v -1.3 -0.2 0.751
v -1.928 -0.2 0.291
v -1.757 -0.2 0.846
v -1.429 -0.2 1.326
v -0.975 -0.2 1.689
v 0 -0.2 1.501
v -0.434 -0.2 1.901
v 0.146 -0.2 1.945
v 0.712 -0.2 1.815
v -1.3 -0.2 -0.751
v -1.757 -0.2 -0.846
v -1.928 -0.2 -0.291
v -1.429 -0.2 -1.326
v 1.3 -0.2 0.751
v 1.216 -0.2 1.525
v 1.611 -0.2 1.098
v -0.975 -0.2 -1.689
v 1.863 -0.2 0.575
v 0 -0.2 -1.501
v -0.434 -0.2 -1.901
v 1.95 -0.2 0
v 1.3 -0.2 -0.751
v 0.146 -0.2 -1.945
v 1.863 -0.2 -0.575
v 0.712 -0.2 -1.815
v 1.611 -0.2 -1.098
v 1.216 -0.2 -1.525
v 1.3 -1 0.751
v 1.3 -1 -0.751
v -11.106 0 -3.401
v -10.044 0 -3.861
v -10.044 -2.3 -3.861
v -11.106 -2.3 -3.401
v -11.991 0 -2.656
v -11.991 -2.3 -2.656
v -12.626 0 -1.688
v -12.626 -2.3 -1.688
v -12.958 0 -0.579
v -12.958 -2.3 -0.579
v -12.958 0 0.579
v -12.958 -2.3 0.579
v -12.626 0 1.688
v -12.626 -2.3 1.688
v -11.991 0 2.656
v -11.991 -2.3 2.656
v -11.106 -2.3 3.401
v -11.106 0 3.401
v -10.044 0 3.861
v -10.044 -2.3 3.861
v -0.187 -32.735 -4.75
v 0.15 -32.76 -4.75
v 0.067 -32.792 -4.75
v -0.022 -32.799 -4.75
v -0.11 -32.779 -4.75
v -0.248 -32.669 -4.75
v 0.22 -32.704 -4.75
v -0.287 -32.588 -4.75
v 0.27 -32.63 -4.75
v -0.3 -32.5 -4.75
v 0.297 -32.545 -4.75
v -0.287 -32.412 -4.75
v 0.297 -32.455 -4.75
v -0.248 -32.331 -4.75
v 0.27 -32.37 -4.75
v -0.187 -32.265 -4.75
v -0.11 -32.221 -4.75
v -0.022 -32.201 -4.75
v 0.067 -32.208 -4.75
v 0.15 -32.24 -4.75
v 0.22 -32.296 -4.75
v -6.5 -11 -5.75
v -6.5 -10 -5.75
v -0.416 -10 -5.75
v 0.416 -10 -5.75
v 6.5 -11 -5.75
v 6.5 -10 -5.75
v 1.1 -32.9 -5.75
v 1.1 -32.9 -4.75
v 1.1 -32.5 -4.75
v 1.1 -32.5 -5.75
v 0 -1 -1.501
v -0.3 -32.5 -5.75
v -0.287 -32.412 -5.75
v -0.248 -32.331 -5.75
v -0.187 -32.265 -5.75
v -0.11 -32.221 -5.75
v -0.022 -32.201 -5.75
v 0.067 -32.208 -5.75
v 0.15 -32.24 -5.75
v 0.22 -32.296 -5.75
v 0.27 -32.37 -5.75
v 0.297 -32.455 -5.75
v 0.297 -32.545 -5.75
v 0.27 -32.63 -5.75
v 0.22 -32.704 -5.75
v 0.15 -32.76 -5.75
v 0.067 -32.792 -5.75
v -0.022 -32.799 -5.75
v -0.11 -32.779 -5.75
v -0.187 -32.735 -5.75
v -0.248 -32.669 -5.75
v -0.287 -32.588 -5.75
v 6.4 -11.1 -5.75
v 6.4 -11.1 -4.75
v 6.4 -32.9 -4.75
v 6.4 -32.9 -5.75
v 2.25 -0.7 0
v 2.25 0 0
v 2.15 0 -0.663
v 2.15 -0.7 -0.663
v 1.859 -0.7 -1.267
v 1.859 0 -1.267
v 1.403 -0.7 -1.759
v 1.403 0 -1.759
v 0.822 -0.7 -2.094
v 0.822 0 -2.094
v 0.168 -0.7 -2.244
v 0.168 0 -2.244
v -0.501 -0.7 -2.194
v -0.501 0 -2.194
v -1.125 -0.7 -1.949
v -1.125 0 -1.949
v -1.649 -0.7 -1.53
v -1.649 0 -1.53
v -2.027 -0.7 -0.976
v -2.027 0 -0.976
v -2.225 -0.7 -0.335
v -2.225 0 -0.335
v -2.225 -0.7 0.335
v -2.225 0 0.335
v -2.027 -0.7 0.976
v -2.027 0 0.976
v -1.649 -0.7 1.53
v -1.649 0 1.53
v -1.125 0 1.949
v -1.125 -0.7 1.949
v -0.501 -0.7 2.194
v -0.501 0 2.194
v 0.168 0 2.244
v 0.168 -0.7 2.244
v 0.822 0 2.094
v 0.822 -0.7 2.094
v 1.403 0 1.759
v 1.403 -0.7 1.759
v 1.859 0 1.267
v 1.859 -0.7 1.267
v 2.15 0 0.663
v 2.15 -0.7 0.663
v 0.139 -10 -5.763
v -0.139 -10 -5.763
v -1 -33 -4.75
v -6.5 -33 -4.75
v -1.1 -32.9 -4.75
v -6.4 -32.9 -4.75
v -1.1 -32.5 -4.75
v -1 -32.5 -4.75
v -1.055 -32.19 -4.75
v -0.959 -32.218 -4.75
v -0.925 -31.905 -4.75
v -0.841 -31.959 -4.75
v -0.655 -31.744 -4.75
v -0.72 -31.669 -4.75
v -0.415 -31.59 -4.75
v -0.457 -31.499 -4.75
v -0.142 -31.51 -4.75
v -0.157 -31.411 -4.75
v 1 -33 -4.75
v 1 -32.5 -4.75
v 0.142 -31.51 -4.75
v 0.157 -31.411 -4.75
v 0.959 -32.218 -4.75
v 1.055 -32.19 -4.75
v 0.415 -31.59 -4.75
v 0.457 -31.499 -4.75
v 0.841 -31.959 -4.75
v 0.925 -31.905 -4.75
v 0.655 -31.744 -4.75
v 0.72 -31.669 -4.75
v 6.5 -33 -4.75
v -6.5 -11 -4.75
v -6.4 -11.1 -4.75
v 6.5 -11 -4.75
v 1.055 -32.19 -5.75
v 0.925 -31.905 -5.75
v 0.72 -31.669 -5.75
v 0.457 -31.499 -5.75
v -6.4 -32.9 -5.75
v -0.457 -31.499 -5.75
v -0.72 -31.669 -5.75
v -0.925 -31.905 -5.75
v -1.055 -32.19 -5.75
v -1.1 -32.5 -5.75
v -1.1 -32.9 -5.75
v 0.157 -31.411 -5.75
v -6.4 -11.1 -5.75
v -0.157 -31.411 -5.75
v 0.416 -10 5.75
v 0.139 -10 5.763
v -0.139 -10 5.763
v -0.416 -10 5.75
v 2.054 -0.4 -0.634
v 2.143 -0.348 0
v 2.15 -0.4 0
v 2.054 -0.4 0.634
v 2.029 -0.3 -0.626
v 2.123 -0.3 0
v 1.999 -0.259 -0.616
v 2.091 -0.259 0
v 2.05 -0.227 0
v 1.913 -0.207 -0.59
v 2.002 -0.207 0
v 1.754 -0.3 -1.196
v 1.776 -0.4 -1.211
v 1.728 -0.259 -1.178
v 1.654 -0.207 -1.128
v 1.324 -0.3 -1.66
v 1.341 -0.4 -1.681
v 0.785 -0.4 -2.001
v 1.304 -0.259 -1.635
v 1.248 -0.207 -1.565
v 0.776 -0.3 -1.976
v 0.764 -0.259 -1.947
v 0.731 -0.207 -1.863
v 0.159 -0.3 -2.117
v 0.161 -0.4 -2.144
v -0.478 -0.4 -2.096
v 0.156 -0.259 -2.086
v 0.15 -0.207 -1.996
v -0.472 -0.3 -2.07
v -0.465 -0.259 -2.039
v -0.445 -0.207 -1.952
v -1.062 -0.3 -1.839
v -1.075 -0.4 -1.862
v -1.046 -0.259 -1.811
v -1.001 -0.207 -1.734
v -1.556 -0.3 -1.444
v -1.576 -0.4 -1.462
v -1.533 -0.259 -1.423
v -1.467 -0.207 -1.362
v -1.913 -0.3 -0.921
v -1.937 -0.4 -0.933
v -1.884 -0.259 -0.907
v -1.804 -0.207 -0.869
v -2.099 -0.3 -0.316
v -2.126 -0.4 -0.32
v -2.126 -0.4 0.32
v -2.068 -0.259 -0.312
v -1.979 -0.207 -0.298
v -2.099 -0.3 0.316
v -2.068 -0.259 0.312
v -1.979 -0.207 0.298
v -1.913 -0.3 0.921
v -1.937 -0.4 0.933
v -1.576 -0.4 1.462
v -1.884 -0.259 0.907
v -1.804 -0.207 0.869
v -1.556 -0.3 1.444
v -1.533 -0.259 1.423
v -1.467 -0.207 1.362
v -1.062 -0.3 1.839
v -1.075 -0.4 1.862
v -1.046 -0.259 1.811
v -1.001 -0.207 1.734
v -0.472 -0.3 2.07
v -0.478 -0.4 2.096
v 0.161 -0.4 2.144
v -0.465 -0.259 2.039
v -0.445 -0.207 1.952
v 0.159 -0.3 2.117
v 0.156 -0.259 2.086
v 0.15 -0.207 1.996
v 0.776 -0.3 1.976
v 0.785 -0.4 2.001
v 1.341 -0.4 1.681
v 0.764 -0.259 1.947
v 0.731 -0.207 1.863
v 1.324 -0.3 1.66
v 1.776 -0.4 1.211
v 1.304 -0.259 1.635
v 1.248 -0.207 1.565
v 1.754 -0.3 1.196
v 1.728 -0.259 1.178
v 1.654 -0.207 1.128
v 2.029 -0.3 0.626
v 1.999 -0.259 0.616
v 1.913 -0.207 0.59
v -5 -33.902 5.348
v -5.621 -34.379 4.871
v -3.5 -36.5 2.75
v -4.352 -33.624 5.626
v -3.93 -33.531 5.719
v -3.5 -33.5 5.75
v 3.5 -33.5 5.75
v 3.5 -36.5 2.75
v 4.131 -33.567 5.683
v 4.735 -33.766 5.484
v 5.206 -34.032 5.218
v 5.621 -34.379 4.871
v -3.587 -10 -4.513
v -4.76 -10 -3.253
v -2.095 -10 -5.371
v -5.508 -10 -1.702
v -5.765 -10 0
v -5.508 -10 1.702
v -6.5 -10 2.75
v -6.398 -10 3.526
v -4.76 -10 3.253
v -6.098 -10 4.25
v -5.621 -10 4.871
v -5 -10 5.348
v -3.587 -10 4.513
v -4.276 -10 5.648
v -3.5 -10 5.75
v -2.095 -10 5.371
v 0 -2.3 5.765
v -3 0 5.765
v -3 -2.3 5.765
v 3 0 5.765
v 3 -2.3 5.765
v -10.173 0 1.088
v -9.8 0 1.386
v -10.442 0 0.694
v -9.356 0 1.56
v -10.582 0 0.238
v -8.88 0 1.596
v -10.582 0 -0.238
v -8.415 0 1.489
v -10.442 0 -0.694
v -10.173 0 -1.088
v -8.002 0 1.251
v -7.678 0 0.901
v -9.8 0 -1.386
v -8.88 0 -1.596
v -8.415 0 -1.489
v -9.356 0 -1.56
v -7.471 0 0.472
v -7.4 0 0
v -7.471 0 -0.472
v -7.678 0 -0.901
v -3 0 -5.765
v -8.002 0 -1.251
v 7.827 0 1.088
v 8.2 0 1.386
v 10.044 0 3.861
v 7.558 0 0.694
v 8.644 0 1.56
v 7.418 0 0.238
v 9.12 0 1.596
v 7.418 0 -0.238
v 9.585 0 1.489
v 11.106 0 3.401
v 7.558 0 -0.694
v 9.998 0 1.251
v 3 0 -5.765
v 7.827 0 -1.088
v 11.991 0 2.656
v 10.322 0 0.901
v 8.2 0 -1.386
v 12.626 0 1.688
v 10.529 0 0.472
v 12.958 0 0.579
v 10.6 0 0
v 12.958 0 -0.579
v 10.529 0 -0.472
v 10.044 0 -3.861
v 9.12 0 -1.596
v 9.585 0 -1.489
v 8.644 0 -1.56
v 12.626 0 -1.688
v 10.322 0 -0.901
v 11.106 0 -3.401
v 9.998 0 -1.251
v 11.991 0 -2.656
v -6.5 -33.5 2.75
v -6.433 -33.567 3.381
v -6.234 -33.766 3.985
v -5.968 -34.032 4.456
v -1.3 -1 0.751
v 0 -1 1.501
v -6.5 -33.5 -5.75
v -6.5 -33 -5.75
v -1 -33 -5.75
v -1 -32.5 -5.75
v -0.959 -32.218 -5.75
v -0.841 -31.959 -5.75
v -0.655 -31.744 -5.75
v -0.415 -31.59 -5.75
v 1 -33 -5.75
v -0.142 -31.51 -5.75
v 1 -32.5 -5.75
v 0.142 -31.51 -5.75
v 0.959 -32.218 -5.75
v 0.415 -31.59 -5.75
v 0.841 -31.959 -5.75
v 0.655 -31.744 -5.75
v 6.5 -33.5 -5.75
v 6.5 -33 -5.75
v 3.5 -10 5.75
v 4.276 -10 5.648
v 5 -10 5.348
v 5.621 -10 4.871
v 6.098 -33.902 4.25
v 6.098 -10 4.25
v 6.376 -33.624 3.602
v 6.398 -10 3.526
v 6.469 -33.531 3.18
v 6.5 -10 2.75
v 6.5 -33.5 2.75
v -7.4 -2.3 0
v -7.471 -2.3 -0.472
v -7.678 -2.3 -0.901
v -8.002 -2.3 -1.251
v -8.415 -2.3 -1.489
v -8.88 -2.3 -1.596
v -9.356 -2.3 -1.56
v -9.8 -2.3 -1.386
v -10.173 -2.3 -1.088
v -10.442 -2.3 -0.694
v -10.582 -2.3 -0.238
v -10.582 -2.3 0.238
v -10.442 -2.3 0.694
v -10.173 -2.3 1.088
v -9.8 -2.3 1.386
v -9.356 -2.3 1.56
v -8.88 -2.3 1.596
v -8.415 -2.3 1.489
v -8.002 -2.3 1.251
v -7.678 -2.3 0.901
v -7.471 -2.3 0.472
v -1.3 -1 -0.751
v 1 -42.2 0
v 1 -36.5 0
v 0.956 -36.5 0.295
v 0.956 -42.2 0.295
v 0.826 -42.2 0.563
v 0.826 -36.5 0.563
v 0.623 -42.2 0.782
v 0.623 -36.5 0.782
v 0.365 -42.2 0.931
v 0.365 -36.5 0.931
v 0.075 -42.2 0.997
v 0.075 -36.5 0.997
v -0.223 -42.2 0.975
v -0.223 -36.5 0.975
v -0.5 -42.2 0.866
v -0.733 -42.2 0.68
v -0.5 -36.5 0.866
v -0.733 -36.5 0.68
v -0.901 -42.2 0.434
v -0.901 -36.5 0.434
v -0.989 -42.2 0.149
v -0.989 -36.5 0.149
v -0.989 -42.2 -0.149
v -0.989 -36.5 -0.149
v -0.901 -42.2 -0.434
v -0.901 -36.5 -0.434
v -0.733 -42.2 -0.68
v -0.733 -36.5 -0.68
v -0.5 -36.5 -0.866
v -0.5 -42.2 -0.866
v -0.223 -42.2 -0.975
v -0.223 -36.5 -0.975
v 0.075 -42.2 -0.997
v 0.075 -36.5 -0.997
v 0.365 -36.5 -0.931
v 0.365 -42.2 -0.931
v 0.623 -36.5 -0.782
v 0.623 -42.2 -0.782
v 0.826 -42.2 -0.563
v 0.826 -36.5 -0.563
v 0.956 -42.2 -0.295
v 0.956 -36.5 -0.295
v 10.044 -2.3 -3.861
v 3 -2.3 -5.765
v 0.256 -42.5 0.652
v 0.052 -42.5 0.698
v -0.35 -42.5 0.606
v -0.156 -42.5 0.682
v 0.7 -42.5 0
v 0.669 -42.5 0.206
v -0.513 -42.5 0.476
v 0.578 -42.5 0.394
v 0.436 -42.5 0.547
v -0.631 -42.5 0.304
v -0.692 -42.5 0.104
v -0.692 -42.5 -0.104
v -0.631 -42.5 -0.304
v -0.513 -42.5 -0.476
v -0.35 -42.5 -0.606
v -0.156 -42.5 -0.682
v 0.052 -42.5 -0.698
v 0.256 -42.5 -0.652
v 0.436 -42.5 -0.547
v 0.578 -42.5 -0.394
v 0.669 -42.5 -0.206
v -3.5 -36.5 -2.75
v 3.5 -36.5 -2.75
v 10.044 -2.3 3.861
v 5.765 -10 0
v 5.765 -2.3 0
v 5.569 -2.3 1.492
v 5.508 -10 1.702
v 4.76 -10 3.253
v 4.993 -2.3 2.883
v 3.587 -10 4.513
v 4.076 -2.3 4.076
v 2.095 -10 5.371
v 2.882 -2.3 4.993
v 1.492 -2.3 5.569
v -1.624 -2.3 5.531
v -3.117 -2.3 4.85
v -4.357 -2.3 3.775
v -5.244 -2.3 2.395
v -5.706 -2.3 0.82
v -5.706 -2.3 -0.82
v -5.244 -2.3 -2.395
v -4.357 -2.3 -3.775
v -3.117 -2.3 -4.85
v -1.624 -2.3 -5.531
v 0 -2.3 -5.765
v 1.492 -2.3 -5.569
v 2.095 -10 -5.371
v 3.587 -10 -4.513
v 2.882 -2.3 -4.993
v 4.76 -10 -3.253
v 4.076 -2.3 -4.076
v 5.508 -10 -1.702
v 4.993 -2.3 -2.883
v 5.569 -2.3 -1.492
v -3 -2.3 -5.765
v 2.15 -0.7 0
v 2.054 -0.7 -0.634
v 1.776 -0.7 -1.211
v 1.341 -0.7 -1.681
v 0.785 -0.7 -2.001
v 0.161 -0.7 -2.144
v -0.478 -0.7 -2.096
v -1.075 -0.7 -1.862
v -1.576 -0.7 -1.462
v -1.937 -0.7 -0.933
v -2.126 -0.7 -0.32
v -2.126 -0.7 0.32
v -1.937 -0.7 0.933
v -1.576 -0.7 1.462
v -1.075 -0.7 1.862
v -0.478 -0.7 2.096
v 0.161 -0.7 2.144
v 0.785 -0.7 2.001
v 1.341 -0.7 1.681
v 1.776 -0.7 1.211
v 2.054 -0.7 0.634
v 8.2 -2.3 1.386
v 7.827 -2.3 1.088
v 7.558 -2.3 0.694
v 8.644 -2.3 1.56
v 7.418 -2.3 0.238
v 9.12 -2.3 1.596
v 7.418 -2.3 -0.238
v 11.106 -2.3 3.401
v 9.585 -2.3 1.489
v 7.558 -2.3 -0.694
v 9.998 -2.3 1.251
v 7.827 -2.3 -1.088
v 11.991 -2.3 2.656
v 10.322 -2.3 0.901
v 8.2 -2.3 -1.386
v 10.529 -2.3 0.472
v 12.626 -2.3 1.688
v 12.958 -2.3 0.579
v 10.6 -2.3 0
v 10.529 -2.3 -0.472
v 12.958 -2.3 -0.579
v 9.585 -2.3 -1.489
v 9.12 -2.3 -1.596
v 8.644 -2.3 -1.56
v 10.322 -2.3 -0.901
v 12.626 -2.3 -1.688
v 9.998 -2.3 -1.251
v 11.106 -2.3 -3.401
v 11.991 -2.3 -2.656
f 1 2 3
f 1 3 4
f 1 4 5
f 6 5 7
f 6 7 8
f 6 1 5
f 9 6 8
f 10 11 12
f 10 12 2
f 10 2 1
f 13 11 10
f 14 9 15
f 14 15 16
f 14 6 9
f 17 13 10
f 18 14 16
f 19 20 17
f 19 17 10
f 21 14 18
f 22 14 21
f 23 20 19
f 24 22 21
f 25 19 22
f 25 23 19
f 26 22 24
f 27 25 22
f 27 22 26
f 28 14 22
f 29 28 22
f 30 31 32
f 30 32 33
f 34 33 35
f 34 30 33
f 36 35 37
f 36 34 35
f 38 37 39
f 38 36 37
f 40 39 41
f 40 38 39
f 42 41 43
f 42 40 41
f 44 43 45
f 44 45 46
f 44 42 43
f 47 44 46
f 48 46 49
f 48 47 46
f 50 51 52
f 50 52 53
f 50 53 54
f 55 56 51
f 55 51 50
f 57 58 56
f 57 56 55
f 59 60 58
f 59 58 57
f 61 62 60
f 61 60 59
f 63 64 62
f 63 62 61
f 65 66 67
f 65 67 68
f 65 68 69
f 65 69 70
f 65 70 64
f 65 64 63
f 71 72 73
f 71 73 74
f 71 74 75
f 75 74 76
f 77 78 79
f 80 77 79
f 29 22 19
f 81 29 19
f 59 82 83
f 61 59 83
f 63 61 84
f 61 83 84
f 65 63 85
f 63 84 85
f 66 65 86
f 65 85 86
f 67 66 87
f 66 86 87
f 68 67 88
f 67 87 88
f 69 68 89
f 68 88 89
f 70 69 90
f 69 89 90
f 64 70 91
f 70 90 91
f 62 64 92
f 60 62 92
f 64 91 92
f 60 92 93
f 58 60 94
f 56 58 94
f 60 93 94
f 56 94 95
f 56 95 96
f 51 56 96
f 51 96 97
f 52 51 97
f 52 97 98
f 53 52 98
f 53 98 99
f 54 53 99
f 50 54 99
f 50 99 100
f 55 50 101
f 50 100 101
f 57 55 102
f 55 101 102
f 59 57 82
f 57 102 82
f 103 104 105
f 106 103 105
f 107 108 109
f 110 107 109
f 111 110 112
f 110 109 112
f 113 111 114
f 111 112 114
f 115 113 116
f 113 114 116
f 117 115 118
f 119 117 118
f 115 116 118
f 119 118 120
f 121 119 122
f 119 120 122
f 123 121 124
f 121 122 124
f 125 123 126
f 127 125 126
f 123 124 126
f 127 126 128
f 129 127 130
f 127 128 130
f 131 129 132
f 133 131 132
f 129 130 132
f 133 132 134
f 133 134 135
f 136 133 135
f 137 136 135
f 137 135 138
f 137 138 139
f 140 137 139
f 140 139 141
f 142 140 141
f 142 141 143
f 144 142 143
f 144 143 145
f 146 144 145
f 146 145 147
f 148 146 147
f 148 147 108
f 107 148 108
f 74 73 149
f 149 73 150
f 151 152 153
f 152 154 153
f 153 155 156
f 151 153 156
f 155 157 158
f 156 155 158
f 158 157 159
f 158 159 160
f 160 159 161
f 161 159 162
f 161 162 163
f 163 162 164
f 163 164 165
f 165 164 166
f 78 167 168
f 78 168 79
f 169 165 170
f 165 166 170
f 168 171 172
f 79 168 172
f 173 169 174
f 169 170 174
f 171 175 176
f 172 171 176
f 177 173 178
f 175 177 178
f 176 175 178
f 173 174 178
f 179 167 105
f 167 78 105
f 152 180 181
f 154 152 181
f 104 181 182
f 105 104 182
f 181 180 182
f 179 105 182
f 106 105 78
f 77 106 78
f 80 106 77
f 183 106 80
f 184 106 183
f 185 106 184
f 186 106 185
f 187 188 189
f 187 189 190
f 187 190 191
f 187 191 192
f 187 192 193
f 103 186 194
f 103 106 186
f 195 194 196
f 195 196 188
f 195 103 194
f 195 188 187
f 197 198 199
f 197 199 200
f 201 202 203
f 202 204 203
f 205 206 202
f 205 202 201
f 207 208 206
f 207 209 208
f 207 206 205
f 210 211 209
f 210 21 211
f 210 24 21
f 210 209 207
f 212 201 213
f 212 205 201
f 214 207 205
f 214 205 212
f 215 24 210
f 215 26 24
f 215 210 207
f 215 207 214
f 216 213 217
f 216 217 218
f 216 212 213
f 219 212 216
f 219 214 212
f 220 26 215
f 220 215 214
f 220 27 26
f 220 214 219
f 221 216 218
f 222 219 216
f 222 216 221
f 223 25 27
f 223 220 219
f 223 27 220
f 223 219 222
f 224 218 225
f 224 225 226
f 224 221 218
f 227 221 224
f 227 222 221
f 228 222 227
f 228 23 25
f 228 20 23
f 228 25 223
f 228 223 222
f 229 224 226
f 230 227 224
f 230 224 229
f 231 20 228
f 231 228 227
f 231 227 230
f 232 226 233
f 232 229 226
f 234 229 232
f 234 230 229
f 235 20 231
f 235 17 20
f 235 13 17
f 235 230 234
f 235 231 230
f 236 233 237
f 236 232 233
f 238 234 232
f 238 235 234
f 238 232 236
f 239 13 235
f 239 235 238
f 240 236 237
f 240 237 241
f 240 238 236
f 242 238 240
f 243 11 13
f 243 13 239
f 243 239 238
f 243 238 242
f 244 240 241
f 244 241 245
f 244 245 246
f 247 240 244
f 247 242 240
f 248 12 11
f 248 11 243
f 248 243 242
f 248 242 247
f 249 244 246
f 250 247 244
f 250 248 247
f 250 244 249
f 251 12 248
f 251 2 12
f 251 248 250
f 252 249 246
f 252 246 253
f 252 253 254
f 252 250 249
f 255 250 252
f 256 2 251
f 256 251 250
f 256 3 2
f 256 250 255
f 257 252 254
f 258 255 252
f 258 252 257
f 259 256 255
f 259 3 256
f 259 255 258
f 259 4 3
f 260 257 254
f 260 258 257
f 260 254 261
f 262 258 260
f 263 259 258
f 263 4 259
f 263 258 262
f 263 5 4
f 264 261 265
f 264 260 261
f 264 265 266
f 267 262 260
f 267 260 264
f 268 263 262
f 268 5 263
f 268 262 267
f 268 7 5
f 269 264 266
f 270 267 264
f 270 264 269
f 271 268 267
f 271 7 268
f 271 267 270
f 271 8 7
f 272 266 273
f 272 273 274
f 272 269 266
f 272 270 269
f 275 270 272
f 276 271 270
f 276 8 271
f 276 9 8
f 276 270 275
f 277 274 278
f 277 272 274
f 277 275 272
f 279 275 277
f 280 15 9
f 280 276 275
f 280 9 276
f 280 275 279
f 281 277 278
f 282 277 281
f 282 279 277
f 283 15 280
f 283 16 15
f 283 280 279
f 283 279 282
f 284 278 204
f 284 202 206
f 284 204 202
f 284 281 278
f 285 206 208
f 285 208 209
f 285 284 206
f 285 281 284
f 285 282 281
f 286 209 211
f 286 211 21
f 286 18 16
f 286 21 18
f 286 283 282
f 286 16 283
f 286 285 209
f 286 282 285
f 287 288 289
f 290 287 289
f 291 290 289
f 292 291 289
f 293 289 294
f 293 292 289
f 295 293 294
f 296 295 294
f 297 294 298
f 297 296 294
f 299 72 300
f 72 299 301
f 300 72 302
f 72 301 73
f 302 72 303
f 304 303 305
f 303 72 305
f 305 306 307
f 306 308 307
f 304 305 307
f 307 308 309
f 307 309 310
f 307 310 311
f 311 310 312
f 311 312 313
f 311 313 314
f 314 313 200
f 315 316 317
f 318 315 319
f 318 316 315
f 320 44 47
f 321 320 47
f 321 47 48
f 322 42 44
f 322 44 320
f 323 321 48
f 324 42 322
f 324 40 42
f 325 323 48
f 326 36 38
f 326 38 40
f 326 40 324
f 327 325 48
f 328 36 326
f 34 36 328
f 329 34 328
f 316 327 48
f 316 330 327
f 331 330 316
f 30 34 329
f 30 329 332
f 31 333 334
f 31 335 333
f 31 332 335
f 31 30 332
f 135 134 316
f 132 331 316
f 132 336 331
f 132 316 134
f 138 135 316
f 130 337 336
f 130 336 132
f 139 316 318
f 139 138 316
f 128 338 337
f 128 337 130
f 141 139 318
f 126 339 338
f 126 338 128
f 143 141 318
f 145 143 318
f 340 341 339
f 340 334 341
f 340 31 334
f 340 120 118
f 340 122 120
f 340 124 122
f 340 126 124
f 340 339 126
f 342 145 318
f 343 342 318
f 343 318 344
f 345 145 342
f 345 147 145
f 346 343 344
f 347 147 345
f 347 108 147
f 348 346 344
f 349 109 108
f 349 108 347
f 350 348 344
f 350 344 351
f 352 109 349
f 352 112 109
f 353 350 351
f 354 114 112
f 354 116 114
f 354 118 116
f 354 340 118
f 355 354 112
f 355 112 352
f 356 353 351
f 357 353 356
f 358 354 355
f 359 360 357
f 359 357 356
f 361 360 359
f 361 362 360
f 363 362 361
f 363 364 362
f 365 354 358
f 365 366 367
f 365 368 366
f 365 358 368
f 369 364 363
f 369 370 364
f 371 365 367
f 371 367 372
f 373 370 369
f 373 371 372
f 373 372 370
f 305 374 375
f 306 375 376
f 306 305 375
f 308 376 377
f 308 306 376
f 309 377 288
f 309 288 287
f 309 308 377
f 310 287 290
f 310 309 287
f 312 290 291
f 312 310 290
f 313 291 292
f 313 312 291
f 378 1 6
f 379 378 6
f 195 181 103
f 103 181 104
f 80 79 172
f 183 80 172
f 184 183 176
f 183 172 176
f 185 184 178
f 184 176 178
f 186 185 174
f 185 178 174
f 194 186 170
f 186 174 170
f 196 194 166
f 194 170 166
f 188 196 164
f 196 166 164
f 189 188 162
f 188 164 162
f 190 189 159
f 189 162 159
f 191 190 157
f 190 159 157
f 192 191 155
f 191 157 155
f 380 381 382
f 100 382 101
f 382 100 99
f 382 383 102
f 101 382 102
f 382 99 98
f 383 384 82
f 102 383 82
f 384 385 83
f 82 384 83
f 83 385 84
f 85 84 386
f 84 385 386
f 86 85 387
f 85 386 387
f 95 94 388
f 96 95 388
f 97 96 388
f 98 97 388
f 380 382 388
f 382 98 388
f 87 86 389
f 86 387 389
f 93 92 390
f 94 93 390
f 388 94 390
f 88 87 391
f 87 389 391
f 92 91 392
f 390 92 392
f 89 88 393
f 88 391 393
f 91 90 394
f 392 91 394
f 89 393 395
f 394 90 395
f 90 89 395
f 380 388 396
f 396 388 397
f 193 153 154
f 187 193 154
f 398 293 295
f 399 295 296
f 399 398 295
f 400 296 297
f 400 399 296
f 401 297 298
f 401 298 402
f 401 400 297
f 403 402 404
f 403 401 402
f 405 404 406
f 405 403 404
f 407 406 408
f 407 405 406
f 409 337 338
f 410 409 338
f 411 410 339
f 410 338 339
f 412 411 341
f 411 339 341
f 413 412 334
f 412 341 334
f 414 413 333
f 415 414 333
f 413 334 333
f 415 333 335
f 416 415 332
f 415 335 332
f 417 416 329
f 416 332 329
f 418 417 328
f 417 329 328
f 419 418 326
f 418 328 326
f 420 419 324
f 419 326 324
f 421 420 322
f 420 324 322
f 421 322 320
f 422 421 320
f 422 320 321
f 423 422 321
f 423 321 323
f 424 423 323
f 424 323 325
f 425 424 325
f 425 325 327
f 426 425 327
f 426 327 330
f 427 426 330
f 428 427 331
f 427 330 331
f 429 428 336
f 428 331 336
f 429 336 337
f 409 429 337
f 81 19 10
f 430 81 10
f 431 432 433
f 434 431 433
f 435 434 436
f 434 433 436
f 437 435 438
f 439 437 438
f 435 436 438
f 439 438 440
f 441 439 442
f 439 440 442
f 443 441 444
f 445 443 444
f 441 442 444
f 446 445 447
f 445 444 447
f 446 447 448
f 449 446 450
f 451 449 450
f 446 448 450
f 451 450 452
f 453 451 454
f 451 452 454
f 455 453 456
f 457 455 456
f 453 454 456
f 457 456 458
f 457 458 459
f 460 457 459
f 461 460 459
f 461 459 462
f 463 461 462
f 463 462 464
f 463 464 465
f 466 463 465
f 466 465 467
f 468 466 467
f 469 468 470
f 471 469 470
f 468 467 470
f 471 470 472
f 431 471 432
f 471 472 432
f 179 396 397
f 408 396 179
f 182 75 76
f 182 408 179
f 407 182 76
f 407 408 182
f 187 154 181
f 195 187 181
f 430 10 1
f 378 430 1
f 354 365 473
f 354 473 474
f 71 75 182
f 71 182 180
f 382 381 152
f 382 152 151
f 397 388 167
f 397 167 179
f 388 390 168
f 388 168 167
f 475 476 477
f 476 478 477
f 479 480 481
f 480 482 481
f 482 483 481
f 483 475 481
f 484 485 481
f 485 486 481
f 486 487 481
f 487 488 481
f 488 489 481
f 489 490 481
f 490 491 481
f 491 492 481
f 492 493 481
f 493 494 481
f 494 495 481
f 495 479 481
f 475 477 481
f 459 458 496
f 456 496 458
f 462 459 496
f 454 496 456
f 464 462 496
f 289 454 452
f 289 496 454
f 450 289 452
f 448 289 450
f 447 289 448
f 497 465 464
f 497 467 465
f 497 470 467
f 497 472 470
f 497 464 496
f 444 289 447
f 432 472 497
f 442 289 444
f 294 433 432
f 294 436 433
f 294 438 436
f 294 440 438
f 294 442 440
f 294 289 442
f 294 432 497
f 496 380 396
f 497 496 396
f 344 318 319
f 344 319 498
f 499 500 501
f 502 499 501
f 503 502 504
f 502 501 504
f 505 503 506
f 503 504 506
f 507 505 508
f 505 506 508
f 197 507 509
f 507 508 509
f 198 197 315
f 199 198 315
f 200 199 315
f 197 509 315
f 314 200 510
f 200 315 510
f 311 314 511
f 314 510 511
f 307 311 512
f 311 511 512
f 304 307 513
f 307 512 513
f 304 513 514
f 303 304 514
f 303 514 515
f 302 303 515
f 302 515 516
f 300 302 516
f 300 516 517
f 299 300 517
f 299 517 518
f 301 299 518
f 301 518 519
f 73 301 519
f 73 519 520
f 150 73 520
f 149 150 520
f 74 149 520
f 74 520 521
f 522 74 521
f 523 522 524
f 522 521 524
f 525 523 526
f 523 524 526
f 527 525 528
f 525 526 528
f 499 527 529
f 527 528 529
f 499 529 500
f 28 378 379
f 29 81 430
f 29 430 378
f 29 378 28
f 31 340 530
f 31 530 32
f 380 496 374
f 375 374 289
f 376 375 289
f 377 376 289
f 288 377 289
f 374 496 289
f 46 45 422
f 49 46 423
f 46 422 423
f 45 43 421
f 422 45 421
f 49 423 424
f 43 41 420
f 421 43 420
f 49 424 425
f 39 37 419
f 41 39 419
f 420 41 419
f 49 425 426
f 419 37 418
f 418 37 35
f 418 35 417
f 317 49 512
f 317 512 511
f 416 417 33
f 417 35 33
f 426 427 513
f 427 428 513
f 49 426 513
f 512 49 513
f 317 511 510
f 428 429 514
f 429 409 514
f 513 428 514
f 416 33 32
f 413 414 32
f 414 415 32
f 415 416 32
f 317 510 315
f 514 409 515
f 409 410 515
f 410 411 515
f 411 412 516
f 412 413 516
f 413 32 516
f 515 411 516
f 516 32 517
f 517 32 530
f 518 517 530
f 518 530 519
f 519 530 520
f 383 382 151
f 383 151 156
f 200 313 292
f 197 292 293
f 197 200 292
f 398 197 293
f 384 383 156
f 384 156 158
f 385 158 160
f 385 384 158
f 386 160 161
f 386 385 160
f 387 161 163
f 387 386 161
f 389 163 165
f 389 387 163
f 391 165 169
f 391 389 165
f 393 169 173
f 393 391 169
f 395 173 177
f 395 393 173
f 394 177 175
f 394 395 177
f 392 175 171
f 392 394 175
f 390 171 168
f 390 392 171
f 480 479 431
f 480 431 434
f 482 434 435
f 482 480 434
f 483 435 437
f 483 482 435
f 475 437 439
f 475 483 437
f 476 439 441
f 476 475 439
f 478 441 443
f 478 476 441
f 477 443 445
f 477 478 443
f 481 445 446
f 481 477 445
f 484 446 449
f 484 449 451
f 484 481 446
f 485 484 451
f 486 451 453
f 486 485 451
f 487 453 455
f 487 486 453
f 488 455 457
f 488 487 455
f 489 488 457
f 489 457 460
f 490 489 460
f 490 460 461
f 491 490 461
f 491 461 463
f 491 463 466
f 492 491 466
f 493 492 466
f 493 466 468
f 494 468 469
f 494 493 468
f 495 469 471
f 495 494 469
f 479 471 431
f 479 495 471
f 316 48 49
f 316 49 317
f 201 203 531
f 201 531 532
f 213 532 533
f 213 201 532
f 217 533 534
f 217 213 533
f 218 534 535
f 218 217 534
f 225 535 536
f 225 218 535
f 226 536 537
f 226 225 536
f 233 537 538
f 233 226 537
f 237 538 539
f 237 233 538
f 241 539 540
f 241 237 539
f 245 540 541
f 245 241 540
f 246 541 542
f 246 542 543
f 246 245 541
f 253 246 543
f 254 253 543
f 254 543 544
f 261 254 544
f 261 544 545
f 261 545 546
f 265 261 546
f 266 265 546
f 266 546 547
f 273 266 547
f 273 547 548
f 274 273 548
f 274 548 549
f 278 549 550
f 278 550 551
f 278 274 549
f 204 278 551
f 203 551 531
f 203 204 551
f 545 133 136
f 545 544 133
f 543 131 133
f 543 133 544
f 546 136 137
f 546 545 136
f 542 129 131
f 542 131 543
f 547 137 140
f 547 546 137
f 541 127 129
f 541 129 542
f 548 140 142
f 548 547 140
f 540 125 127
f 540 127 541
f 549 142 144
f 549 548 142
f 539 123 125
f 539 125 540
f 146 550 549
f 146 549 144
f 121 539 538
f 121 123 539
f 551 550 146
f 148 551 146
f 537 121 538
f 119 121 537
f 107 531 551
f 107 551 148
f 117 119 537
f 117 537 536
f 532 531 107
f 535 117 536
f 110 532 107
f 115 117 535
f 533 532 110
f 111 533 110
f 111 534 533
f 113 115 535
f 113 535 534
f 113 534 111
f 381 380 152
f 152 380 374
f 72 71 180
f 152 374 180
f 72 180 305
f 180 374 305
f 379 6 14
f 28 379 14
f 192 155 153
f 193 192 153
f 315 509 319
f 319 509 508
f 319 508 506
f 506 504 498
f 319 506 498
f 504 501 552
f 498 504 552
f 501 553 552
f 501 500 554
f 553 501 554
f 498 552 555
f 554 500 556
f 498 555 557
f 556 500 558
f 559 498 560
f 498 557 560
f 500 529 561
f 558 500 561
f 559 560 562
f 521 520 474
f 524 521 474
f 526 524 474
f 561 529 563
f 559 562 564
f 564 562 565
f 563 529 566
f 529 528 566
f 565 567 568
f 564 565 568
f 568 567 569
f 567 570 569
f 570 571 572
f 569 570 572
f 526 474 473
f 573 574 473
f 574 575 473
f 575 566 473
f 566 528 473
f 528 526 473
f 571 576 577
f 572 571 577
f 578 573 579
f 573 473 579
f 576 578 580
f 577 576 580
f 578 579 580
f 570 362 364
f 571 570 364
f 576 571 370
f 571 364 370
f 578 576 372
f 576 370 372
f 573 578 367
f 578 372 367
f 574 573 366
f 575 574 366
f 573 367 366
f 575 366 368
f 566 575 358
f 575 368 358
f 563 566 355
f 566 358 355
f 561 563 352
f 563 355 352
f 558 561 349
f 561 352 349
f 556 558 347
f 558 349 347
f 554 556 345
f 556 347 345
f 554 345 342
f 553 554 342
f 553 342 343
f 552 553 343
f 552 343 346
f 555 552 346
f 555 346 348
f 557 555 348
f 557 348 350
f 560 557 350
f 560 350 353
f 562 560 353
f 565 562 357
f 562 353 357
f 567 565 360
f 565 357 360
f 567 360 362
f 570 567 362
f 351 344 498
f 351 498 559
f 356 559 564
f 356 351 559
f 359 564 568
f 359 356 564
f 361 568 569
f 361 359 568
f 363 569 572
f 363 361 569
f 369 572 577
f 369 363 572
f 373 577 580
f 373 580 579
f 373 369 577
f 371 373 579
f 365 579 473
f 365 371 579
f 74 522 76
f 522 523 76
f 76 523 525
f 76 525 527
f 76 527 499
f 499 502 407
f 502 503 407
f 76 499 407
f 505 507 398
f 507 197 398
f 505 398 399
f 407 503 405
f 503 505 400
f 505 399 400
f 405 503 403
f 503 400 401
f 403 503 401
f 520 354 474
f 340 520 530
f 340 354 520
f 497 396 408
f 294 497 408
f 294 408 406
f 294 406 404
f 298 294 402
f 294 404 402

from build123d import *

# Parameters (mm, degrees)
SKETCH1_R                = 1.6
BOSS_EXTRUDE1_DEPTH      = 2.3
SKETCH2_R                = 5.765
BOSS_EXTRUDE2_DEPTH      = 7.7
SKETCH3_W                = 13
SKETCH3_H                = 26.5
BOSS_EXTRUDE3_DEPTH      = 5.75
BOSS_EXTRUDE3_DEPTH_BACK = 5.75
SKETCH4_W                = 1
SKETCH4_H                = 6
CHAMFER1_SIZE            = 3
FILLET1_R                = 3
CHAMFER2_SIZE            = 0.3
SKETCH9_R                = 2.25
CUT_EXTRUDE1_DEPTH       = 0.2
CUT_EXTRUDE2_DEPTH       = 1
SKETCH11_R               = 2.25
SKETCH11_R_2             = 2.15
CUT_EXTRUDE3_DEPTH       = 0.5
FILLET2_R                = 0.2
SKETCH12_R               = 0.3
CUT_EXTRUDE4_DEPTH       = 1
BOSS_EXTRUDE4_DEPTH      = 1


with BuildPart() as part:
    # Sketch1 → Boss-Extrude1 (new body)
    with BuildSketch(Plane(origin=(0, 0, 0), x_dir=(1, 0, 0), z_dir=(0, 1, 0))):
        with BuildLine():
            Line((3, 5.765), (-3, 5.765))
            Line((-3, 5.765), (-10.043565082, 3.861472766))
            ThreePointArc((-10.043565082, 3.861472766), (-13, 0), (-10.043565082, -3.861472766))
            Line((-10.043565082, -3.861472766), (-3, -5.765))
            Line((-3, -5.765), (3, -5.765))
            Line((3, -5.765), (10.043565082, -3.861472766))
            ThreePointArc((10.043565082, -3.861472766), (13, 0), (10.043565082, 3.861472766))
            Line((10.043565082, 3.861472766), (3, 5.765))
        make_face()
        with Locations((9, 0)):
            Circle(SKETCH1_R, mode=Mode.SUBTRACT)
        with Locations((-9, 0)):
            Circle(SKETCH1_R, mode=Mode.SUBTRACT)
    extrude(amount=-BOSS_EXTRUDE1_DEPTH)

    # Sketch2 → Boss-Extrude2 (add)
    with BuildSketch(Plane.XZ.offset(2.3)):
        Circle(SKETCH2_R)
    extrude(amount=BOSS_EXTRUDE2_DEPTH)

    # Sketch3 → Boss-Extrude3 (add, two sides)
    with BuildSketch(Plane.XY) as boss_extrude3_sk:
        with Locations((0, -23.25)):
            Rectangle(SKETCH3_W, SKETCH3_H)
    extrude(amount=BOSS_EXTRUDE3_DEPTH)
    extrude(boss_extrude3_sk.sketch, amount=-BOSS_EXTRUDE3_DEPTH_BACK)

    # Sketch4 → Revolve1 (revolve)
    with BuildSketch(Plane.XY):
        with Locations((0.5, -39.5)):
            Rectangle(SKETCH4_W, SKETCH4_H)
    revolve(axis=Axis((0, -36.5, 0), (0, -1, 0)))

    # Chamfer1
    chamfer1_edges = [part.edges().sort_by_distance(p)[0] for p in [
        (-6.5, -36.5, 0),
        (0, -36.5, -5.75),
        (6.5, -36.5, 0),
        (0, -36.5, 5.75),
    ]]
    chamfer(chamfer1_edges, length=CHAMFER1_SIZE)

    # Fillet1
    fillet1_edges = [part.edges().sort_by_distance(p)[0] for p in [
        (-6.5, -21.75, 5.75),
        (6.5, -21.75, 5.75),
    ]]
    fillet(fillet1_edges, radius=FILLET1_R)

    # Chamfer2
    chamfer2_edges = [part.edges().sort_by_distance(p)[0] for p in [
        (-1, -42.5, 0),
    ]]
    chamfer(chamfer2_edges, length=CHAMFER2_SIZE)

    # Sketch9 → Cut-Extrude1 (cut)
    with BuildSketch(Plane(origin=(0, 0, 0), x_dir=(1, 0, 0), z_dir=(0, 1, 0))):
        Circle(SKETCH9_R)
        Polygon((0, 1.5011107), (-1.3, 0.75055535), (-1.3, -0.75055535), (0, -1.5011107), (1.3, -0.75055535), (1.3, 0.75055535), align=None, mode=Mode.SUBTRACT)
    extrude(amount=-CUT_EXTRUDE1_DEPTH, mode=Mode.SUBTRACT)

    # Sketch10 → Cut-Extrude2 (cut)
    with BuildSketch(Plane(origin=(0, 0, 0), x_dir=(1, 0, 0), z_dir=(0, 1, 0))):
        Polygon((1.3, 0.75055535), (0, 1.5011107), (-1.3, 0.75055535), (-1.3, -0.75055535), (0, -1.5011107), (1.3, -0.75055535), align=None)
    extrude(amount=-CUT_EXTRUDE2_DEPTH, mode=Mode.SUBTRACT)

    # Sketch11 → Cut-Extrude3 (cut)
    with BuildSketch(Plane(origin=(0, -0.2, 0), x_dir=(1, 0, 0), z_dir=(0, 1, 0))):
        Circle(SKETCH11_R)
        Circle(SKETCH11_R_2, mode=Mode.SUBTRACT)
    extrude(amount=-CUT_EXTRUDE3_DEPTH, mode=Mode.SUBTRACT)

    # Fillet2
    fillet2_edges = [part.edges().sort_by_distance(p)[0] for p in [
        (-2.15, -0.2, 0),
    ]]
    fillet(fillet2_edges, radius=FILLET2_R)

    # Sketch12 → Cut-Extrude4 (cut)
    with BuildSketch(Plane(origin=(0, 0, -5.75), x_dir=(-1, 0, 0), z_dir=(0, 0, -1))):
        with Locations((0, -32.5)):
            Circle(SKETCH12_R)
        with BuildLine():
            Line((-6.5, -11), (6.5, -11))
            Line((6.5, -11), (6.5, -33))
            Line((6.5, -33), (1, -33))
            Line((1, -33), (1, -32.5))
            ThreePointArc((1, -32.5), (0, -31.5), (-1, -32.5))
            Line((-1, -32.5), (-1, -33))
            Line((-1, -33), (-6.5, -33))
            Line((-6.5, -33), (-6.5, -11))
        make_face()
    extrude(amount=-CUT_EXTRUDE4_DEPTH, mode=Mode.SUBTRACT)

    # Sketch13 → Boss-Extrude4 (add)
    with BuildSketch(Plane(origin=(0, 0, -4.75), x_dir=(-1, 0, 0), z_dir=(0, 0, -1))):
        with BuildLine():
            Line((6.4, -11.1), (-6.4, -11.1))
            Line((-6.4, -11.1), (-6.4, -32.9))
            Line((-6.4, -32.9), (-1.1, -32.9))
            Line((-1.1, -32.9), (-1.1, -32.5))
            ThreePointArc((-1.1, -32.5), (0, -31.4), (1.1, -32.5))
            Line((1.1, -32.5), (1.1, -32.9))
            Line((1.1, -32.9), (6.4, -32.9))
            Line((6.4, -32.9), (6.4, -11.1))
        make_face()
    extrude(amount=BOSS_EXTRUDE4_DEPTH)


solid = part.part
